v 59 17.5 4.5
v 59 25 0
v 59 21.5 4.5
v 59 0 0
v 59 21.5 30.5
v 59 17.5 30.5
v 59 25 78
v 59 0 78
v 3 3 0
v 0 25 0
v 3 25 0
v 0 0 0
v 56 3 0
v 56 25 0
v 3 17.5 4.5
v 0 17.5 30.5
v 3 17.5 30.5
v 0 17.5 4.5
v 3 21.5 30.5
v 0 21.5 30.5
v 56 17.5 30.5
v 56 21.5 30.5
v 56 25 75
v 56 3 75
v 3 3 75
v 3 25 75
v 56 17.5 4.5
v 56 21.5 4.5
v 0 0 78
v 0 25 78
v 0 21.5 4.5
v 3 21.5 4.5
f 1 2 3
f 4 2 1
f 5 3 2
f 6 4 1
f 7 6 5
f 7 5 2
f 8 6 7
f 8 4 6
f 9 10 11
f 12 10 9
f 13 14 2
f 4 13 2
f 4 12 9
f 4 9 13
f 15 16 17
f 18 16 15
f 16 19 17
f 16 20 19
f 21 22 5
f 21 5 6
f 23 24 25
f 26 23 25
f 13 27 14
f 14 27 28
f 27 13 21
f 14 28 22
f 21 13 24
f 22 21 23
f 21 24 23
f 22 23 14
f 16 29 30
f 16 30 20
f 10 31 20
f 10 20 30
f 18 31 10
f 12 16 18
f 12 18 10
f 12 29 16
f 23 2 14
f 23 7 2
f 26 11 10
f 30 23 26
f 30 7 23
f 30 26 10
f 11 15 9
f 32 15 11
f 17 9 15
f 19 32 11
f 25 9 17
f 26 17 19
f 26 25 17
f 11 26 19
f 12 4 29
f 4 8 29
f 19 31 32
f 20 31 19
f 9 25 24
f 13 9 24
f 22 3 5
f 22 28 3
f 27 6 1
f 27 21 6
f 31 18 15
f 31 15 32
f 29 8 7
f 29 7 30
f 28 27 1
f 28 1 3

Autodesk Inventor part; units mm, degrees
ref_plane "YZ Plane" through (0, 0, 0) normal (1, 0, 0) x (0, 1, 0)
ref_plane "XZ Plane" through (0, 0, 0) normal (0, 1, 0) x (-1, 0, 0)
ref_plane "XY Plane" through (0, 0, 0) normal (0, 0, 1) x (1, 0, 0)
sketch "Sketch2" plane through (0, 0, 0) normal (0, 1, 0) x (-1, 0, 0)
  line L0 (0, 0) -> (-59, 0)
  line L1 (-59, 0) -> (-59, 78)
  line L2 (-59, 78) -> (0, 78)
  line L3 (0, 78) -> (0, 0)
  dimension "d0" = 59
  dimension "d1" = 78
extrude "Extrusion1" add sketch "Sketch2" along normal blind 25
shell "Shell1" thickness 3 removed faces 1 at (39.3333, 25, 52)
sketch "Sketch4" plane through (59, 0, 0) normal (0, 0, -1) x (-1, 0, 0)
  point P0 (59, 0)
sketch "Sketch5" plane through (3, 3, 3) normal (0, 0, 1) x (1, 0, 0)
  line L0 (0, 0) -> (0, 22) projected
  line L1 (0, 22) -> (53, 22) projected
  line L2 (0, 0) -> (53, 0)
  line L3 (53, 0) -> (53, 22)
  line L4 (53, 22) -> (0, 22)
  line L5 (0, 22) -> (0, 0)
  point P0 (-3, -3)
extrude "Extrusion3" cut sketch "Sketch5" against normal blind 10
sketch "Sketch6" plane through (0, 0, 0) normal (-1, 0, 0) x (0, 0, 1)
  line L0 (4.5, 21.5) -> (30.5, 21.5)
  line L1 (30.5, 21.5) -> (30.5, 17.5)
  line L2 (30.5, 17.5) -> (4.5, 17.5)
  line L3 (4.5, 17.5) -> (4.5, 21.5)
  line L4 (0, 0) -> (0, 25) projected
  line L5 (0, 0) -> (78, 0) projected
  dimension "d19" = 26
  dimension "d20" = 4
  dimension "d21" = 4.5
  dimension "d22" = 17.5
extrude "Extrusion4" cut sketch "Sketch6" against normal through all
properties part number "arduino array box v03"
